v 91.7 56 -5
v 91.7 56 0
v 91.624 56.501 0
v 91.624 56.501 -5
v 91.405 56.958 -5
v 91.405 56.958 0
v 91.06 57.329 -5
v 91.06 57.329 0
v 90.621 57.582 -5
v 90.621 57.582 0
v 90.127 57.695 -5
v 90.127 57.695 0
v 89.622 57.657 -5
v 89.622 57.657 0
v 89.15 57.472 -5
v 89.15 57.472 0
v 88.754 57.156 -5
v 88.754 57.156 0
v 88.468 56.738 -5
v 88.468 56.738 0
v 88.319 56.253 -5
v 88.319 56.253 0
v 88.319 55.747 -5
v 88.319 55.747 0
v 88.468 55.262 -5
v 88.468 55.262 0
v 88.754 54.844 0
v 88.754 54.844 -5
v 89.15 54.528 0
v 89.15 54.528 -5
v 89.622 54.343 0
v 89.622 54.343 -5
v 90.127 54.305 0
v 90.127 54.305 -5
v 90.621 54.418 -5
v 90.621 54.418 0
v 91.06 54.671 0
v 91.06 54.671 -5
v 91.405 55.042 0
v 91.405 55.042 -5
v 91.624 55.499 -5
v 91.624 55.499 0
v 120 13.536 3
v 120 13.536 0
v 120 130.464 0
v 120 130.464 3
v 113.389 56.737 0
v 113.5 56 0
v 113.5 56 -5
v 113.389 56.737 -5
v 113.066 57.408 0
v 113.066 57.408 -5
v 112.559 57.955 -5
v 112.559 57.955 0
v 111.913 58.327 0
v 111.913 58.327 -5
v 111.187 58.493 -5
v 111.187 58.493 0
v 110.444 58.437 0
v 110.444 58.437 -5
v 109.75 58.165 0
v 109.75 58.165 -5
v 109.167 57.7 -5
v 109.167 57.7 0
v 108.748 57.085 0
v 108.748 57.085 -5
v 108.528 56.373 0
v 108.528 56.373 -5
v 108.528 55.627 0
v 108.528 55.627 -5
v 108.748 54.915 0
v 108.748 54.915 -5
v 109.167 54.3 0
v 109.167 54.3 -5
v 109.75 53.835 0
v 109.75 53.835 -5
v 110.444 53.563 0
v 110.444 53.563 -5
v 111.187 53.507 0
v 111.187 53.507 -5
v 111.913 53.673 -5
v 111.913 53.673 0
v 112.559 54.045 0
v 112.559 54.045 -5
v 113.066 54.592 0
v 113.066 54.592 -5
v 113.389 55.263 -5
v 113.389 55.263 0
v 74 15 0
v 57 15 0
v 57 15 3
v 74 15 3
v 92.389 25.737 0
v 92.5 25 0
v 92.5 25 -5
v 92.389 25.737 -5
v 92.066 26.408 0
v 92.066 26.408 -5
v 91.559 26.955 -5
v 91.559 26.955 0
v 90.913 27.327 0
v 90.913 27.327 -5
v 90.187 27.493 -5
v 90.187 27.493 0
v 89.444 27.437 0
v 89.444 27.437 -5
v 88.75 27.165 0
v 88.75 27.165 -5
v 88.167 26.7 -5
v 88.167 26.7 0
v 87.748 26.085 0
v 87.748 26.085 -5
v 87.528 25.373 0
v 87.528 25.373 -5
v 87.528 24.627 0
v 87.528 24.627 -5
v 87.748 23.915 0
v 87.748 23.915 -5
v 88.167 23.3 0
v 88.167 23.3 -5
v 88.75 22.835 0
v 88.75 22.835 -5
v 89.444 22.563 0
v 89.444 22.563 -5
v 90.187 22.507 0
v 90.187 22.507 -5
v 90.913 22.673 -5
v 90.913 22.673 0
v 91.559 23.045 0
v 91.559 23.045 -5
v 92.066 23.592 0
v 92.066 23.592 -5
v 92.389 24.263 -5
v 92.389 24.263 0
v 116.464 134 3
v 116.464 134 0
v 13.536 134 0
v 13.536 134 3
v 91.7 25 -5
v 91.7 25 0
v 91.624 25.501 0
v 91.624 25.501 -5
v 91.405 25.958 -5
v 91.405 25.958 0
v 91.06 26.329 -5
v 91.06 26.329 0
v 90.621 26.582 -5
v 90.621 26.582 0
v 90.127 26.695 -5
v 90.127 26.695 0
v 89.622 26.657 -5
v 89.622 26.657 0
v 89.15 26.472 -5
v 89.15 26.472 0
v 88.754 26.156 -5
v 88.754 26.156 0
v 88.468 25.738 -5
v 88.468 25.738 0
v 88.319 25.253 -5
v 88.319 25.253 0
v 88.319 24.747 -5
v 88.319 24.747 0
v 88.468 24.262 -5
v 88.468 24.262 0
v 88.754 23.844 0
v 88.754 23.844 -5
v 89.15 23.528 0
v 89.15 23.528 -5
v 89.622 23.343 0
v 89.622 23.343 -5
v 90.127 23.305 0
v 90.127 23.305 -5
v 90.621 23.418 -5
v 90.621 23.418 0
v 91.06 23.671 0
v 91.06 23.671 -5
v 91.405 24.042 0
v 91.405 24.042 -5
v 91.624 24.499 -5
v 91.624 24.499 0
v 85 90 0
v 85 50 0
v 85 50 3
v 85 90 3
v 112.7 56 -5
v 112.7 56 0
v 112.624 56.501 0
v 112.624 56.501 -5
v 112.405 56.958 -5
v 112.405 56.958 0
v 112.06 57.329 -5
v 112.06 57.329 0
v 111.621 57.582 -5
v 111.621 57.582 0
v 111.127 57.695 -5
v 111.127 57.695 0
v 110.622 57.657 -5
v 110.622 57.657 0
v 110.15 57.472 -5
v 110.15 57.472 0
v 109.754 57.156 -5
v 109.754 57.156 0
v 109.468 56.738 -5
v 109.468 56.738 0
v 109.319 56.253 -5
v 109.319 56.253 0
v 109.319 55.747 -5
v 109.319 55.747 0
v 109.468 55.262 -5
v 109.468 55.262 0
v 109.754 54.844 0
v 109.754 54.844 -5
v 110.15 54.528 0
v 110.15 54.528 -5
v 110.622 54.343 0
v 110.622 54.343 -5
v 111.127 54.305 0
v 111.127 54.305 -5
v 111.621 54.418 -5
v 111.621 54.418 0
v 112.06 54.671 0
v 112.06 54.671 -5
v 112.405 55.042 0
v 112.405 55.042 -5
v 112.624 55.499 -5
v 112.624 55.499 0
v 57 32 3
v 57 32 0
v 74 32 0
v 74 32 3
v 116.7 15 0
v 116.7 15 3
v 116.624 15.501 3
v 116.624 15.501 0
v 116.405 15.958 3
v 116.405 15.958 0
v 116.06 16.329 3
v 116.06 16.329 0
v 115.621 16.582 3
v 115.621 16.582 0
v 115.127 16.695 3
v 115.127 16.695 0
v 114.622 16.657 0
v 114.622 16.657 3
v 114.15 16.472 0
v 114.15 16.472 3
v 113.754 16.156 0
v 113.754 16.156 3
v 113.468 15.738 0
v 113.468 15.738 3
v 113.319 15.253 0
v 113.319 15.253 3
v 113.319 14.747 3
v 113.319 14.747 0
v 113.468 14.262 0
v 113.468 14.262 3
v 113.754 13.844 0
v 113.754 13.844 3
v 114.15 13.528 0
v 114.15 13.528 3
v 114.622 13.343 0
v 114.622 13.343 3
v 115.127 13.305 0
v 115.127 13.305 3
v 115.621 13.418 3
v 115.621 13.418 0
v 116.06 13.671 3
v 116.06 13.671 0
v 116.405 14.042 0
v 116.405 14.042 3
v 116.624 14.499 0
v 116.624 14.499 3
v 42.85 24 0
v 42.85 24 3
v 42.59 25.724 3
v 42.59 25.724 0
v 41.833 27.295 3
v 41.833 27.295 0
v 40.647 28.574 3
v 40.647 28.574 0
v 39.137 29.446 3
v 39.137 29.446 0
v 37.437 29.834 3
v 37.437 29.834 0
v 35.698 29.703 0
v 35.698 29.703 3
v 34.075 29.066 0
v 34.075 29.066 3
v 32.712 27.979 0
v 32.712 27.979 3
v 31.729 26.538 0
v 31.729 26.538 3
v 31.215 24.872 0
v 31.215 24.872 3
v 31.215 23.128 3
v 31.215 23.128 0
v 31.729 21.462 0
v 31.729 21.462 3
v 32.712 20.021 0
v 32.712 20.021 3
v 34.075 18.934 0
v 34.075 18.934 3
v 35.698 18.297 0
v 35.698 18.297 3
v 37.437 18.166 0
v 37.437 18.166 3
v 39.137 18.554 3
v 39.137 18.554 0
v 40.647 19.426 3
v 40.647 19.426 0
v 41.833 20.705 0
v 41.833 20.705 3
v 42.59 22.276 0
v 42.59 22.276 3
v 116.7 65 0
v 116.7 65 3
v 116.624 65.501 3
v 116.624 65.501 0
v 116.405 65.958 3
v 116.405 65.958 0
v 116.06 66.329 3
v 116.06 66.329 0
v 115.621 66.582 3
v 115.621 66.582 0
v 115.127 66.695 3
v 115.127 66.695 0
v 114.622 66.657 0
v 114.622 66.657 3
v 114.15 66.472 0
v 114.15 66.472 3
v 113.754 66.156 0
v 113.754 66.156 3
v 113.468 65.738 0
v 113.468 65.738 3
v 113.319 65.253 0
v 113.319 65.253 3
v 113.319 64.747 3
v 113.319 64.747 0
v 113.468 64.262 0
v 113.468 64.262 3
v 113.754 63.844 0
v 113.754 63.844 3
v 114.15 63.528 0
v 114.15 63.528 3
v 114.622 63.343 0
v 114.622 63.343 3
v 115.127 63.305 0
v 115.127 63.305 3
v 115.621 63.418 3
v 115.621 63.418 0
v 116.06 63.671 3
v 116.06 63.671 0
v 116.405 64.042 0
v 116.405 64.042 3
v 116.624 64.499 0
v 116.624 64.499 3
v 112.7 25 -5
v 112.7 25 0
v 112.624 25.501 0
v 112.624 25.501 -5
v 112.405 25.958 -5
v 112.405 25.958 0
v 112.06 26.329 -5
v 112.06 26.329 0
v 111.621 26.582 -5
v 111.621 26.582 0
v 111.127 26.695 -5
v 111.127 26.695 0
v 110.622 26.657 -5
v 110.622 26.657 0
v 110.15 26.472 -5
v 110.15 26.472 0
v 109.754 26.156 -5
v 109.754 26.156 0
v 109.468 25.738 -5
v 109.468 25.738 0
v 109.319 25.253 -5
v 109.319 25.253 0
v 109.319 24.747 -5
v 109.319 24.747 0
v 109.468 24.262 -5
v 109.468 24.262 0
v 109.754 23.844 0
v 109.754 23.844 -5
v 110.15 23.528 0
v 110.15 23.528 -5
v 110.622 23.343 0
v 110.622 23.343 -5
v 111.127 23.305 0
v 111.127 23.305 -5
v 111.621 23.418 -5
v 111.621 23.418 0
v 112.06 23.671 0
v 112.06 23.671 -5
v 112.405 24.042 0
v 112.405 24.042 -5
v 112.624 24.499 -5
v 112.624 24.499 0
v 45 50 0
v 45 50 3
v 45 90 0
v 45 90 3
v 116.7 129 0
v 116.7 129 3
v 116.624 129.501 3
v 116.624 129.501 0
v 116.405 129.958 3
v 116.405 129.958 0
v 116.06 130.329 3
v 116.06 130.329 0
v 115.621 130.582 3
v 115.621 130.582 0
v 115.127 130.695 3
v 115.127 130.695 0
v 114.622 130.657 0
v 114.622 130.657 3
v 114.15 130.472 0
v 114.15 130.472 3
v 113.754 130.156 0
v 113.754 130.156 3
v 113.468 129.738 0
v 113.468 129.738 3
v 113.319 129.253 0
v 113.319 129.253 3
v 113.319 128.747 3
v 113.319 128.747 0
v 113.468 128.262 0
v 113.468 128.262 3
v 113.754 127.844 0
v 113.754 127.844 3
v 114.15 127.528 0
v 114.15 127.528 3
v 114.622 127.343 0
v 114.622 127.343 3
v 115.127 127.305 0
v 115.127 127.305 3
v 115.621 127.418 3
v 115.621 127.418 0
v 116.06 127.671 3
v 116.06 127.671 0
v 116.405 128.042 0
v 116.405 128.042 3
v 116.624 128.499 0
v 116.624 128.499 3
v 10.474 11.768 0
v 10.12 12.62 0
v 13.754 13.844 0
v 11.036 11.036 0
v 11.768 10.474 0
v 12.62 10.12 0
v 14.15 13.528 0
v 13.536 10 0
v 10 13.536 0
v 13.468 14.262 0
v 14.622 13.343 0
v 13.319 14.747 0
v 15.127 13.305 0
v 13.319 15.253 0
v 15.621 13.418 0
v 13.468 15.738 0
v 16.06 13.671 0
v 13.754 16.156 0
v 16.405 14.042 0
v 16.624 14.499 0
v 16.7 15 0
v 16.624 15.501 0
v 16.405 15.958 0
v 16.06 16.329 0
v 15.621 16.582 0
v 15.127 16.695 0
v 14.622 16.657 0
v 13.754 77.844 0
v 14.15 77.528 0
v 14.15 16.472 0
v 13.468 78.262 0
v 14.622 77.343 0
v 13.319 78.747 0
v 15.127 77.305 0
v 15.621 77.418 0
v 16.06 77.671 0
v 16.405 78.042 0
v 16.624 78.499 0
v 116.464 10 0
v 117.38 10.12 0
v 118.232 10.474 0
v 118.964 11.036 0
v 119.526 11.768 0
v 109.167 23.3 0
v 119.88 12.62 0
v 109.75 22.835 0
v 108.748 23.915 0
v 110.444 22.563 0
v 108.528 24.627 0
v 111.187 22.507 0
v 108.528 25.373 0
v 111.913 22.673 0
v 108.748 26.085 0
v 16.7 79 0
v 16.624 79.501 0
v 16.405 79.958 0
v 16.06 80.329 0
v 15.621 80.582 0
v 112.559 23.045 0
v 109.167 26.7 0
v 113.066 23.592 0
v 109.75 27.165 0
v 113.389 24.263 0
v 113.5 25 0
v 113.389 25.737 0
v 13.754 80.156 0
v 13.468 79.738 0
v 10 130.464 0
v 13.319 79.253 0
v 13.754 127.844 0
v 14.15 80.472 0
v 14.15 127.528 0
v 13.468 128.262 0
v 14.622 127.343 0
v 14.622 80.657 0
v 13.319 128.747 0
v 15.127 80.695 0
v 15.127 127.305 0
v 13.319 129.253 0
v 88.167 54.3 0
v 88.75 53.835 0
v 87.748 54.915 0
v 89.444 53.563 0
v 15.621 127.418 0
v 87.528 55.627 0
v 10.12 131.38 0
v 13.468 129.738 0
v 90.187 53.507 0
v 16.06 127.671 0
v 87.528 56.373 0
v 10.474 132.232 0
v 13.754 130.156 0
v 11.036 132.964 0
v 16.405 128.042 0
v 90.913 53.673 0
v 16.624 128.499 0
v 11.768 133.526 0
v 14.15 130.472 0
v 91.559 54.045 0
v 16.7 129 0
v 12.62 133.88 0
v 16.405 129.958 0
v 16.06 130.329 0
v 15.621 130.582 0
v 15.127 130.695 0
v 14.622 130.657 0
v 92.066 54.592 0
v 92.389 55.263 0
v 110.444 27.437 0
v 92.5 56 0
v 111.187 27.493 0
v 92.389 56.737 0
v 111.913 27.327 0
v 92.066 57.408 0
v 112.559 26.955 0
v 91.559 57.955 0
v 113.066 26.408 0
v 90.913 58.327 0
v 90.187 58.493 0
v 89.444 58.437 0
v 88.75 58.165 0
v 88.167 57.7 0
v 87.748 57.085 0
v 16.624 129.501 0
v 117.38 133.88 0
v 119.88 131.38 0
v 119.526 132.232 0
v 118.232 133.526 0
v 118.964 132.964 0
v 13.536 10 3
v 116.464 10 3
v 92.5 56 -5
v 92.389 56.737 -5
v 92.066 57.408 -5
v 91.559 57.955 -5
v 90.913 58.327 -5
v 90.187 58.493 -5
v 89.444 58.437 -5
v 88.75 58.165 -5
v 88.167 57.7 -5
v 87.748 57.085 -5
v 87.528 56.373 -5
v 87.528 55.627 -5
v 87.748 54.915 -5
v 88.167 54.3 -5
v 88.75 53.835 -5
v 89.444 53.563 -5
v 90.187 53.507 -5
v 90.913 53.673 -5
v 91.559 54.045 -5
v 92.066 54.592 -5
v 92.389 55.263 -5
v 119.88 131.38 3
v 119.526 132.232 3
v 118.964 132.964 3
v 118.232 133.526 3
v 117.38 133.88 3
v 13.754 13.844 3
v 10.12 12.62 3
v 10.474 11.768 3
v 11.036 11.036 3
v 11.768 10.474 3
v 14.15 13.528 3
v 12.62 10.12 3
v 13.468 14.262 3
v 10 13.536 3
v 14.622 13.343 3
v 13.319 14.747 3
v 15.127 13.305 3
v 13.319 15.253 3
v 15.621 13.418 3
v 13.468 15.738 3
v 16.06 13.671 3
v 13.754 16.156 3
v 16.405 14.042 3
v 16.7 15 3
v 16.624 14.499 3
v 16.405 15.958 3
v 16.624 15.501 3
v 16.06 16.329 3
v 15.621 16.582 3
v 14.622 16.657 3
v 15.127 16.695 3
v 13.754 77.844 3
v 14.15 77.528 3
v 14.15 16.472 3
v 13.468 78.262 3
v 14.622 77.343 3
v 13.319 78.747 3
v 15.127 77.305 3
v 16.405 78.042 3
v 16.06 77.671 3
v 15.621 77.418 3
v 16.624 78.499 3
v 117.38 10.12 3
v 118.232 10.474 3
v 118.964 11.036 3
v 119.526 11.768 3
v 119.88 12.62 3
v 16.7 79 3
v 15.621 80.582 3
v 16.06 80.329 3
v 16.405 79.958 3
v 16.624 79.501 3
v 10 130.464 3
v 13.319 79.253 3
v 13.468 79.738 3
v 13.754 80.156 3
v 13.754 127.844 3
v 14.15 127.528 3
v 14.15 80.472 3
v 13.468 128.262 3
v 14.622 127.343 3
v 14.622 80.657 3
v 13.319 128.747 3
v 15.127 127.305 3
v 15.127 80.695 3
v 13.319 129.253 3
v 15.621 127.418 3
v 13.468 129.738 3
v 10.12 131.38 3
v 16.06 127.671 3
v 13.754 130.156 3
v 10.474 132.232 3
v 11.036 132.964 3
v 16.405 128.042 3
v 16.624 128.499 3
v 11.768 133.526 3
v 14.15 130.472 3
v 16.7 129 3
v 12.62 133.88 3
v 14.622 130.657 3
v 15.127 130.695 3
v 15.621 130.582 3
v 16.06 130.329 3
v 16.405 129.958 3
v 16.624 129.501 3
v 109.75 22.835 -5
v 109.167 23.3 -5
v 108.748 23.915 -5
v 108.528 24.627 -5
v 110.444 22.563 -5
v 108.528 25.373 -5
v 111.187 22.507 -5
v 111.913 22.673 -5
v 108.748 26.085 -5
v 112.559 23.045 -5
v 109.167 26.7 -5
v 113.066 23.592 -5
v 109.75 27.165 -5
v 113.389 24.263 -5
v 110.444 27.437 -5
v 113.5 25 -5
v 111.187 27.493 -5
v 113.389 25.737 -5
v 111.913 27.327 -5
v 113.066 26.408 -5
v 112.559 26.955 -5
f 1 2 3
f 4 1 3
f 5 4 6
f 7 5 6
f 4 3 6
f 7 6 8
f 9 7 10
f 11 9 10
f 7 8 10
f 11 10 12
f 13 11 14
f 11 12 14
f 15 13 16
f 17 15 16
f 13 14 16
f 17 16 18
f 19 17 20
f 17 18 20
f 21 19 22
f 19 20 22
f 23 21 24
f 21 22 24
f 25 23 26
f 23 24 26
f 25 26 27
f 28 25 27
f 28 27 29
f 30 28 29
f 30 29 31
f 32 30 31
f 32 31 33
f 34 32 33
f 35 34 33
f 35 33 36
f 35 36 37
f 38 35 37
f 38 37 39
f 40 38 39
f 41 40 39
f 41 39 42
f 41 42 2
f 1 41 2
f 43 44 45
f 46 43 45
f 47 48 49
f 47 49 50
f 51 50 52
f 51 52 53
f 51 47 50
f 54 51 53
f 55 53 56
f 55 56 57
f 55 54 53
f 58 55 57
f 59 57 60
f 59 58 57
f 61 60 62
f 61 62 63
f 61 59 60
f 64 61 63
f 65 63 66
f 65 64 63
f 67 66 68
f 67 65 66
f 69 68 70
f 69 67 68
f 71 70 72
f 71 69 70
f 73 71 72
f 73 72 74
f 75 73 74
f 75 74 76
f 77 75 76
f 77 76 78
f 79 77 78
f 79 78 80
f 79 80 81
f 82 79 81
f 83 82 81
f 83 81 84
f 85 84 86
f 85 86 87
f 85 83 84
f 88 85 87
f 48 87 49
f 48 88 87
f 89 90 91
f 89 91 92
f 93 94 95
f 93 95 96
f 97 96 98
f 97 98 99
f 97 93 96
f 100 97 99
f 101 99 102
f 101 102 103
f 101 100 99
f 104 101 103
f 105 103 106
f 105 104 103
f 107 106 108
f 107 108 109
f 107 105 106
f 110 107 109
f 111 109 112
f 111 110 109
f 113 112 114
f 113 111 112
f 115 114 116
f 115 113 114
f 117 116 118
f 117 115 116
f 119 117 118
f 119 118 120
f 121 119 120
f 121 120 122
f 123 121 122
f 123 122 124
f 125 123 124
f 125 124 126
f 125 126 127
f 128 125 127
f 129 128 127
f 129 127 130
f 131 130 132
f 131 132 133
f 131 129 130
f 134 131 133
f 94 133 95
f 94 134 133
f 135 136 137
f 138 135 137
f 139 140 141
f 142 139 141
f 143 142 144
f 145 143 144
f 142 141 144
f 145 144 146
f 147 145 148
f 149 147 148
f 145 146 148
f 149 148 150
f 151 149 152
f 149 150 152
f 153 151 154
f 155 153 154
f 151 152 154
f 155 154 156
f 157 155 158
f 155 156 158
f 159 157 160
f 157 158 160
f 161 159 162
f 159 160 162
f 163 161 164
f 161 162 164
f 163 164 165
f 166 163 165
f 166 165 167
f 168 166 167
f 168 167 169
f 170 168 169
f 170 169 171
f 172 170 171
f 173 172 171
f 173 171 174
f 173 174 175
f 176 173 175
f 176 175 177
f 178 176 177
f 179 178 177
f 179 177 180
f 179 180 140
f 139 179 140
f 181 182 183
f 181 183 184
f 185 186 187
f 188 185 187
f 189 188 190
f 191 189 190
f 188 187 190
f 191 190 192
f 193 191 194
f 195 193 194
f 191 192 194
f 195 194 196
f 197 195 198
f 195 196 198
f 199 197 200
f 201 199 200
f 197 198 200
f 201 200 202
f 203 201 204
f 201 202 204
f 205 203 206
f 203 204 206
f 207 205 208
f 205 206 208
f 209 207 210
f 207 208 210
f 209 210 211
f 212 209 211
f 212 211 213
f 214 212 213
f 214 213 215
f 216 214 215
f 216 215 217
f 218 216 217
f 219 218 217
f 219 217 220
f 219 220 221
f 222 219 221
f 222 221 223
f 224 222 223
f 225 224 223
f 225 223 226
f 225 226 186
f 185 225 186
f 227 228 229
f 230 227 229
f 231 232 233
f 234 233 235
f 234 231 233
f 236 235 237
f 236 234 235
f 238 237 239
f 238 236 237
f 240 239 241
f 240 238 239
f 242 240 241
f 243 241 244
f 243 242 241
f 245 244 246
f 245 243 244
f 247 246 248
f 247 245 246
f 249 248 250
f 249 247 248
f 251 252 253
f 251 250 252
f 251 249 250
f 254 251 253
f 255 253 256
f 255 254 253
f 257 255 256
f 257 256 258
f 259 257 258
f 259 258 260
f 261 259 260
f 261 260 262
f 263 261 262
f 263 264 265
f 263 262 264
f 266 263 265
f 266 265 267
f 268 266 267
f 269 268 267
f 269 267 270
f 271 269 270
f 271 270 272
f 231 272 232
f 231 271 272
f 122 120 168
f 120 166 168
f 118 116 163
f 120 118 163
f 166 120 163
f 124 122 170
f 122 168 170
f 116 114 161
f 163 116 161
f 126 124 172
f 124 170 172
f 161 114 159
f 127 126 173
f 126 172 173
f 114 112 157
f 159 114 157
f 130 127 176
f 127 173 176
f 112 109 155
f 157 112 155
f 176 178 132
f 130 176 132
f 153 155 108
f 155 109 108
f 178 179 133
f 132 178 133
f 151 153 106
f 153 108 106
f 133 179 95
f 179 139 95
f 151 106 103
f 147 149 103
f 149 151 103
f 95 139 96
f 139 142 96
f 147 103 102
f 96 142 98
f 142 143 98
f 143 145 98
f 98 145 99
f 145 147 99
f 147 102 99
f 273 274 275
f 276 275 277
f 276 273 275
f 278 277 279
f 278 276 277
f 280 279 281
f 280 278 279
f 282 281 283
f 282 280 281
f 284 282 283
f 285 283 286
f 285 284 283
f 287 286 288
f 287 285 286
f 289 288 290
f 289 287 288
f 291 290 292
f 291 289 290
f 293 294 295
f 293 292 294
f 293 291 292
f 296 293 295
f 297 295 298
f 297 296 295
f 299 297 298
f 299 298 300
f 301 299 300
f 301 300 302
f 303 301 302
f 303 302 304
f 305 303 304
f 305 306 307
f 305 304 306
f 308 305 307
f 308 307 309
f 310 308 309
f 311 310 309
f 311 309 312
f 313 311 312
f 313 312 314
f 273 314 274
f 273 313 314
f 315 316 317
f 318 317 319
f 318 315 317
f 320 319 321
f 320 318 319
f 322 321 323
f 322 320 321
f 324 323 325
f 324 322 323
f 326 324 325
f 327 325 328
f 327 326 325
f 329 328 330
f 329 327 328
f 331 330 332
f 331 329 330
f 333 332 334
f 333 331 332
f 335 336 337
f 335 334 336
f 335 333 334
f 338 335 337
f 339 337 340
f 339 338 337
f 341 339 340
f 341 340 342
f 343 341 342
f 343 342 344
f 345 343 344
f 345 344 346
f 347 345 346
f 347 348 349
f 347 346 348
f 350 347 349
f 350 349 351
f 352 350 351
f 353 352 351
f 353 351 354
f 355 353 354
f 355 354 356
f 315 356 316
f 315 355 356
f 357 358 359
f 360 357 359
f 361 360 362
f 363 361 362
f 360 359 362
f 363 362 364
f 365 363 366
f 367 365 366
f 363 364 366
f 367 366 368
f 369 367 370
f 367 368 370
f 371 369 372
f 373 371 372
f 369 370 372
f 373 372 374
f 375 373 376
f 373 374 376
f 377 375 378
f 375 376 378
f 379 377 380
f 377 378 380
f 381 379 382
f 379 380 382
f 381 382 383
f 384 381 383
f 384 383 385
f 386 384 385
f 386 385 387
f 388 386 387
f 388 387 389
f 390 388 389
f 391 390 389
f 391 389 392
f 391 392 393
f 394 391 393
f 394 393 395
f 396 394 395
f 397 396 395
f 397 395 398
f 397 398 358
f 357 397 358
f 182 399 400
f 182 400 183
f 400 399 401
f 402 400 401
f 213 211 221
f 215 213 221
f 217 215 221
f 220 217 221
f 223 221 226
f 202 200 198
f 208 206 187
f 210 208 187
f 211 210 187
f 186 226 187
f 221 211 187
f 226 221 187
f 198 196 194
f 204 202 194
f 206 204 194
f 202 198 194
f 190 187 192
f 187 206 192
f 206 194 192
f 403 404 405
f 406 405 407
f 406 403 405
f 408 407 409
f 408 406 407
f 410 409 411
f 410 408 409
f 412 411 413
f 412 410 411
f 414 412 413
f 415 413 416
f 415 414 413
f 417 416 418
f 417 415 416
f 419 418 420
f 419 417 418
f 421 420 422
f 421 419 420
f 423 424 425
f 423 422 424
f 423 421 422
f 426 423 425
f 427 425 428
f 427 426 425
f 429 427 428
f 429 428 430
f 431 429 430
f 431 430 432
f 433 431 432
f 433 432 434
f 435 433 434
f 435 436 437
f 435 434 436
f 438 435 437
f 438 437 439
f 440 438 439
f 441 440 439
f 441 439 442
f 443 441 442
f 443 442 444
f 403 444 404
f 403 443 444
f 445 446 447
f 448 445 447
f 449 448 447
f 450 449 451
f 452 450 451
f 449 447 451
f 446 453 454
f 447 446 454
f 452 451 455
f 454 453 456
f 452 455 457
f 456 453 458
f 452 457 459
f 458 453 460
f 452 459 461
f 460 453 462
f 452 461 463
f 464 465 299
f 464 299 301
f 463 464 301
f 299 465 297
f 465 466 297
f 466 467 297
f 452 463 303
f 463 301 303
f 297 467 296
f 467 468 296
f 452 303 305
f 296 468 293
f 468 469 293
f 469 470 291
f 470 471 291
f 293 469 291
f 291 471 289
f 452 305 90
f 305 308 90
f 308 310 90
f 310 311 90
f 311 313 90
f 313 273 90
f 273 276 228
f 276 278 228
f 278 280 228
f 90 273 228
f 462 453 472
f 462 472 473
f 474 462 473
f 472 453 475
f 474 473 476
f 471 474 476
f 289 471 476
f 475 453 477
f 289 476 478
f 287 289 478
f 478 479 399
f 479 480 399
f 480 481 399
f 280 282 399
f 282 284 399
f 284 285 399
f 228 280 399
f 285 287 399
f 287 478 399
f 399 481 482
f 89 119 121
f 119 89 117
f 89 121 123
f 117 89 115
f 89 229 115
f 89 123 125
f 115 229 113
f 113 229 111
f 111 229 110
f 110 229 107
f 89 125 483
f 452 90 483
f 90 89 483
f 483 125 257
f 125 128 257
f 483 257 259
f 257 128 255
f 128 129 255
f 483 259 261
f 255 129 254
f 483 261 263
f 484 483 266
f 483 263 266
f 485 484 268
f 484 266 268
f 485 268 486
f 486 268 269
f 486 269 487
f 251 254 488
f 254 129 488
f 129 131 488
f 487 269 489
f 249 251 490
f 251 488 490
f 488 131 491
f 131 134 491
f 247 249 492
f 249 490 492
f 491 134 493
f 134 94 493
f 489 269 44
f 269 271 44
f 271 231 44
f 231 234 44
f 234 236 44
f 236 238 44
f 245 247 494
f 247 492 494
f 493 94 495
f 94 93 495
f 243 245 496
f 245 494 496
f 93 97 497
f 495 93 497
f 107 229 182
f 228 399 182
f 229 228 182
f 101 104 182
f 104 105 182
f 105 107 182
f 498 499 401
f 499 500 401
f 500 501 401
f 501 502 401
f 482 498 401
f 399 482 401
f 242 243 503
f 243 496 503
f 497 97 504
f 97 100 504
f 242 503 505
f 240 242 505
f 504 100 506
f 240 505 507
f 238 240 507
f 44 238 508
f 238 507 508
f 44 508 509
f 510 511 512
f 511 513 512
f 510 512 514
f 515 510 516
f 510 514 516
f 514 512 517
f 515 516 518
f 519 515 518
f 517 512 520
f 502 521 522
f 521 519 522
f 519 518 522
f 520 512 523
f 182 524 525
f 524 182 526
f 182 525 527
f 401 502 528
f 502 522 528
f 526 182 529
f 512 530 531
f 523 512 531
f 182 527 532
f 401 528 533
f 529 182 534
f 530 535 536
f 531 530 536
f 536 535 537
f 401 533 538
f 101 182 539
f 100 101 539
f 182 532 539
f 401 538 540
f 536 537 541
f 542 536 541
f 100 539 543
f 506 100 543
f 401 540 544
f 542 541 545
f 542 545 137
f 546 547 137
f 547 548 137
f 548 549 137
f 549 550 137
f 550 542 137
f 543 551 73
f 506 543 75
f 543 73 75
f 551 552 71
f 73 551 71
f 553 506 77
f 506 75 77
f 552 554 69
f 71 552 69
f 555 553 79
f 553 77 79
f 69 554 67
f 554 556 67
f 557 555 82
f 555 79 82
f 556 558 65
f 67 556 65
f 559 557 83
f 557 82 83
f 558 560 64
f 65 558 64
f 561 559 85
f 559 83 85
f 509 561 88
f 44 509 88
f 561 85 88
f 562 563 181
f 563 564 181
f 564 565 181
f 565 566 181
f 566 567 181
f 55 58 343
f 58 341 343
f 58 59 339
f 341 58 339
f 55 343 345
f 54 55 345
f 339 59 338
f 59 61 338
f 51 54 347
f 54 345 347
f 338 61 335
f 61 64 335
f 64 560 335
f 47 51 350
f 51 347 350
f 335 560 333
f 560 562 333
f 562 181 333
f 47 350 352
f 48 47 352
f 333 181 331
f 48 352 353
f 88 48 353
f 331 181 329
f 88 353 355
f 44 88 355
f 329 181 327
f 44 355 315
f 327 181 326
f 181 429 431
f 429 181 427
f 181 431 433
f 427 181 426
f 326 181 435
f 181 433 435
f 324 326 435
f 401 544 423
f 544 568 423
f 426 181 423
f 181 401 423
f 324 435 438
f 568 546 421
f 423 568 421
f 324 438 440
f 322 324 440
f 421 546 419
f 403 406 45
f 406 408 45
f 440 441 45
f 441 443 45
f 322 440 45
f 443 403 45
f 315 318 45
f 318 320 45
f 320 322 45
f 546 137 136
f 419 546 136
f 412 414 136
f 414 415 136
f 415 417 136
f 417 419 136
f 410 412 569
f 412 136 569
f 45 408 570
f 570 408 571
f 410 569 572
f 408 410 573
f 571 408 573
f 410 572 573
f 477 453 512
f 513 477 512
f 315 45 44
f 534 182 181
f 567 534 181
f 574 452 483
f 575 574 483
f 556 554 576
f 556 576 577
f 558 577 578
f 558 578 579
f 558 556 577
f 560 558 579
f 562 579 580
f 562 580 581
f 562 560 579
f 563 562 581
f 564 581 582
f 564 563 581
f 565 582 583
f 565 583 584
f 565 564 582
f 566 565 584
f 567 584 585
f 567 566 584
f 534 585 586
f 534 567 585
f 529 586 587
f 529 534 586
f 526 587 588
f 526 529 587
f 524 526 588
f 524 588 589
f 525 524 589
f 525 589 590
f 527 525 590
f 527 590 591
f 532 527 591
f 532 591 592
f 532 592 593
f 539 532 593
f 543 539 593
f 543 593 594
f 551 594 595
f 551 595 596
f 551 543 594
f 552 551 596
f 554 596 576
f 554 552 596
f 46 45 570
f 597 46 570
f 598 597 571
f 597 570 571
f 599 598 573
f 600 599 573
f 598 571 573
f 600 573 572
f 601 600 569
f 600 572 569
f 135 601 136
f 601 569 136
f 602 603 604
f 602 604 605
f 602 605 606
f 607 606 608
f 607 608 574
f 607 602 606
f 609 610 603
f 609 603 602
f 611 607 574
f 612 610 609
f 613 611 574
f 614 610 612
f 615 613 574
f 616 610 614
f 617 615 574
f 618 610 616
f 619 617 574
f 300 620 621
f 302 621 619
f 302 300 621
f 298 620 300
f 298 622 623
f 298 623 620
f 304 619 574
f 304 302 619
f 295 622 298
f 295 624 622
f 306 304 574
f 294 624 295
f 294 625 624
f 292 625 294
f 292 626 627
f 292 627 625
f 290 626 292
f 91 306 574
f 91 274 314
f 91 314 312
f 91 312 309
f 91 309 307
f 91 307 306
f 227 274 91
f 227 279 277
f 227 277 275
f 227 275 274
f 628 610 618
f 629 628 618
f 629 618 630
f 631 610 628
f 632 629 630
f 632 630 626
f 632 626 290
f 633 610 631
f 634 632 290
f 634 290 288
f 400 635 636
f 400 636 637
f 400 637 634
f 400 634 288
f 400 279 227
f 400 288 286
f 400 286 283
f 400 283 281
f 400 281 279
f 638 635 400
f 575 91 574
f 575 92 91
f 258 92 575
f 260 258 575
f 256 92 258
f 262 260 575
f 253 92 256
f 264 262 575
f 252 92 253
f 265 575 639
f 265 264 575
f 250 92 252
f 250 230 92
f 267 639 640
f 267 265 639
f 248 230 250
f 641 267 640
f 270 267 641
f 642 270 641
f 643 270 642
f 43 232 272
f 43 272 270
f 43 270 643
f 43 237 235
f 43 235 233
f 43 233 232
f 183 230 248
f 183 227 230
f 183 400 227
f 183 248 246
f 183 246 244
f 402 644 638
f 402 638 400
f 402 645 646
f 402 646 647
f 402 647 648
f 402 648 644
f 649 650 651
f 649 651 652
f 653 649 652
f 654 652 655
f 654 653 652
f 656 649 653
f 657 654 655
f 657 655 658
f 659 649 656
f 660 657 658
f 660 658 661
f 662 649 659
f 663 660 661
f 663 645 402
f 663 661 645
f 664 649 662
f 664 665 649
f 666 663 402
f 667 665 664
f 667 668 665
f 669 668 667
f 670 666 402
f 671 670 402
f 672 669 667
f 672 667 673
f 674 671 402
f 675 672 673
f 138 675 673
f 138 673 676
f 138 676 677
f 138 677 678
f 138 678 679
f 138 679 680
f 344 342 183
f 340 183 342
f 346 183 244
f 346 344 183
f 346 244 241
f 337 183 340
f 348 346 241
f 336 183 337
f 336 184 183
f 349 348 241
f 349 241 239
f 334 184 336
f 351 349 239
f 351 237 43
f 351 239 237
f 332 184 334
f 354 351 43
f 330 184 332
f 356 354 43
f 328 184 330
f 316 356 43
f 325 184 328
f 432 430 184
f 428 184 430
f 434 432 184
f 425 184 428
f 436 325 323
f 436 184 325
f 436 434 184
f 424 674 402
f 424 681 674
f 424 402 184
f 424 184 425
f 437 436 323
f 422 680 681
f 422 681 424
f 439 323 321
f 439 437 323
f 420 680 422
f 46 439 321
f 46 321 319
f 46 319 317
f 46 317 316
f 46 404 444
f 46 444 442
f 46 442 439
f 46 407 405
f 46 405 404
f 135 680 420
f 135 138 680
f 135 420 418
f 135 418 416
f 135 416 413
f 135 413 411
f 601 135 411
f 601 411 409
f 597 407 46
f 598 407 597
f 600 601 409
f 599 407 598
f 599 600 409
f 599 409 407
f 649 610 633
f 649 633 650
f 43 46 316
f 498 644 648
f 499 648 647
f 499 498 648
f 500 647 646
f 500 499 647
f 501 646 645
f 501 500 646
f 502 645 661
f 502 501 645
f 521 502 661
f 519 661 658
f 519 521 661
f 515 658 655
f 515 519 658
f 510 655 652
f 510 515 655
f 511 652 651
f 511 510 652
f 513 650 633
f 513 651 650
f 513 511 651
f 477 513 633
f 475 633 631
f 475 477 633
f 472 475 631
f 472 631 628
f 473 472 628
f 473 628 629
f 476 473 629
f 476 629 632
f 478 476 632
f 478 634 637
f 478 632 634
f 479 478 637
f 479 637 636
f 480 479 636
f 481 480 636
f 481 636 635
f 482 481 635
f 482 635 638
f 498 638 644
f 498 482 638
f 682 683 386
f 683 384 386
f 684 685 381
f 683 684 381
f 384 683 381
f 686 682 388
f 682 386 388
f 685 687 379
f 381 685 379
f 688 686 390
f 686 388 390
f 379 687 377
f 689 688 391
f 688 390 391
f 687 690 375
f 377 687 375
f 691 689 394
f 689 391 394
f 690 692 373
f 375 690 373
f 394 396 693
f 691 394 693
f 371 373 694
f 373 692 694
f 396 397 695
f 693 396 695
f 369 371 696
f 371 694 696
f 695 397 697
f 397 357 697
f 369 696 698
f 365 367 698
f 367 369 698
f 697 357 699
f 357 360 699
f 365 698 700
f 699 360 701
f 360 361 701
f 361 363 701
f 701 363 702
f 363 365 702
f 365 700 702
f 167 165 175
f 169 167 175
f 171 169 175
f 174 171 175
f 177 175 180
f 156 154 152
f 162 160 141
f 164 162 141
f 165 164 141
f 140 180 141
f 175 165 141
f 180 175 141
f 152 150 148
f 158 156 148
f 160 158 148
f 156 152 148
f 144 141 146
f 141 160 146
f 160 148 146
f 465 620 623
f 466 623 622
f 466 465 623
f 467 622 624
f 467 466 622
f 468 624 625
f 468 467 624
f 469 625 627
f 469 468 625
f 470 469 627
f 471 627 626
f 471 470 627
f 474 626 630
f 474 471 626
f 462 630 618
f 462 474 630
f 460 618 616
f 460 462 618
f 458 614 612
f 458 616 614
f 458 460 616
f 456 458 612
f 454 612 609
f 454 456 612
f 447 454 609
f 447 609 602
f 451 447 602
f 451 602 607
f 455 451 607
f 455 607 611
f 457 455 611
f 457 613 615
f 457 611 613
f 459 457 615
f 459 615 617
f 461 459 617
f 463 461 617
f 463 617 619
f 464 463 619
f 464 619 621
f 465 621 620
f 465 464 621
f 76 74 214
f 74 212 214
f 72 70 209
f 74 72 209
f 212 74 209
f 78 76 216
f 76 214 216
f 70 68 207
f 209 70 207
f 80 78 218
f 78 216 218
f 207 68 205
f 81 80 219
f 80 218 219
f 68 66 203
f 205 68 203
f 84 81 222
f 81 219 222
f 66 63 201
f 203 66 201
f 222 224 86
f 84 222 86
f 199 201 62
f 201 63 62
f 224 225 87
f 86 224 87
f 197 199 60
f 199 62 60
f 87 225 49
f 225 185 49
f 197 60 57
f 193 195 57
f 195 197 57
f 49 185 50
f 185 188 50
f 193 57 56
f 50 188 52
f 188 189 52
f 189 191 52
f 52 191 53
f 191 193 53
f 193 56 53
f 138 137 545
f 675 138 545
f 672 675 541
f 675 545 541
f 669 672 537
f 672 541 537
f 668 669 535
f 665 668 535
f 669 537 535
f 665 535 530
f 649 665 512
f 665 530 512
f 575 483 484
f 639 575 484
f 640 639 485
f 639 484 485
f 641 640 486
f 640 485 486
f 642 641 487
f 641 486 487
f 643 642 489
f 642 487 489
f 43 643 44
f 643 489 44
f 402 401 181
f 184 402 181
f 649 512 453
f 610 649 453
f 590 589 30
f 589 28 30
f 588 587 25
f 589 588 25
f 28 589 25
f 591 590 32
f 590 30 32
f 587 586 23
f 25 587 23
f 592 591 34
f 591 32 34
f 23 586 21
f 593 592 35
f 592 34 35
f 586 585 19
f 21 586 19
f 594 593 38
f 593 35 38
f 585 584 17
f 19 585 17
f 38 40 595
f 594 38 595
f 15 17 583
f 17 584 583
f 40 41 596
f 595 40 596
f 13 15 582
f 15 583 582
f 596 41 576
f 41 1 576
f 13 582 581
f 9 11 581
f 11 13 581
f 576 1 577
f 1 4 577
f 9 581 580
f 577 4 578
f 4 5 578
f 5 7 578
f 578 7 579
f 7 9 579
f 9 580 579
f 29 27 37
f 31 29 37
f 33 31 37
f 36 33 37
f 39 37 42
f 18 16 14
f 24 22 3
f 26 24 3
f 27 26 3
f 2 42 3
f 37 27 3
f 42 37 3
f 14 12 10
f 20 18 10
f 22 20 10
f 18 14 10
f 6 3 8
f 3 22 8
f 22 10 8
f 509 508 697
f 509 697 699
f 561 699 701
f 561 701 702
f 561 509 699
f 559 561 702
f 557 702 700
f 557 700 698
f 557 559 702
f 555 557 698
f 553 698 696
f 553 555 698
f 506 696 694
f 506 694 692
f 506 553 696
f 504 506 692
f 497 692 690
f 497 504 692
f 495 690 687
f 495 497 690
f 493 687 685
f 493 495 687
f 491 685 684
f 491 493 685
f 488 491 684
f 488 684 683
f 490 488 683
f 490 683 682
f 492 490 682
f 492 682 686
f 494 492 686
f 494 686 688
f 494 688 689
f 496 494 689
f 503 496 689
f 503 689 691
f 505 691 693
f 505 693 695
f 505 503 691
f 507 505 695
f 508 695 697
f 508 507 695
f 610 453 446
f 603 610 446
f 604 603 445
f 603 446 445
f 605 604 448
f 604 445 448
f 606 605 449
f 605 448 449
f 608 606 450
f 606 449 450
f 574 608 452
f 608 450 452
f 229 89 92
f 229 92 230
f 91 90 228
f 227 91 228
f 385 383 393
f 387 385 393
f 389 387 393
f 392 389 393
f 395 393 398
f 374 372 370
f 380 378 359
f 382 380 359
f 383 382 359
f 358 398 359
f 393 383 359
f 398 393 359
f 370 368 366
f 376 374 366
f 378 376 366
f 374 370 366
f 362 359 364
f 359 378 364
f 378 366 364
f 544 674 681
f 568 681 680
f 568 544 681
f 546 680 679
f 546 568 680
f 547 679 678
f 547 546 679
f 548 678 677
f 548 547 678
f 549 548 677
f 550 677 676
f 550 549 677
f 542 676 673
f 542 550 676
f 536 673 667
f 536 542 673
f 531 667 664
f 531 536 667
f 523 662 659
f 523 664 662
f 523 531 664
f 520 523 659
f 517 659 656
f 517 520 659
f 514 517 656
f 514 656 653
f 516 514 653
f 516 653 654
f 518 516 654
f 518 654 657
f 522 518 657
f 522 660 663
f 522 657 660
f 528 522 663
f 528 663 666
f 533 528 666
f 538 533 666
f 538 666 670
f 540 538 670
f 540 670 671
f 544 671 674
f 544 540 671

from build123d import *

# Parameters (mm, degrees)
PAD_DEPTH       = 3
SKETCH001_R     = 1.7
HOLE_DEPTH      = 3.001
SKETCH002_W     = 40
SKETCH002_H     = 40
SKETCH002_W_2   = 17
SKETCH002_H_2   = 17
POCKET_DEPTH    = 3.001
SKETCH005_R     = 2.5
PAD001_DEPTH    = 5
SKETCH004_R     = 1.7
HOLE001_DEPTH   = 25
SKETCH003_R     = 5.85
POCKET001_DEPTH = 5


with BuildPart() as part:
    # Sketch → Pad (new body)
    with BuildSketch(Plane.XY):
        with BuildLine():
            Line((10, 130.464466), (10, 13.535534))
            ThreePointArc((10, 13.535534), (11.035534, 11.035534), (13.535534, 10))
            Line((13.535534, 10), (116.464466, 10))
            ThreePointArc((116.464466, 10), (118.964466, 11.035534), (120, 13.535534))
            Line((120, 13.535534), (120, 130.464466))
            ThreePointArc((120, 130.464466), (118.964466, 132.964466), (116.464466, 134))
            Line((116.464466, 134), (13.535534, 134))
            ThreePointArc((13.535534, 134), (11.035534, 132.964466), (10, 130.464466))
        make_face()
    extrude(amount=PAD_DEPTH)

    # Sketch001 → Hole (cut, through all)
    with BuildSketch(Plane.XY):
        with Locations((15, 129)):
            Circle(SKETCH001_R)
        with Locations((15, 79)):
            Circle(SKETCH001_R)
        with Locations((15, 15)):
            Circle(SKETCH001_R)
        with Locations((115, 15)):
            Circle(SKETCH001_R)
        with Locations((115, 65)):
            Circle(SKETCH001_R)
        with Locations((115, 129)):
            Circle(SKETCH001_R)
    extrude(amount=HOLE_DEPTH, mode=Mode.SUBTRACT)

    # Sketch002 → Pocket (cut, through all)
    with BuildSketch(Plane.XY):
        with Locations((65, 70)):
            Rectangle(SKETCH002_W, SKETCH002_H)
        with Locations((65.5, 23.5)):
            Rectangle(SKETCH002_W_2, SKETCH002_H_2)
    extrude(amount=POCKET_DEPTH, mode=Mode.SUBTRACT)

    # Sketch005 → Pad001 (join)
    with BuildSketch(Plane.XY):
        with Locations((90, 56)):
            Circle(SKETCH005_R)
        with Locations((111, 56)):
            Circle(SKETCH005_R)
        with Locations((90, 25)):
            Circle(SKETCH005_R)
        with Locations((111, 25)):
            Circle(SKETCH005_R)
    extrude(amount=-PAD001_DEPTH)

    # Sketch004 → Hole001 (cut)
    with BuildSketch(Plane.XY):
        with Locations((90, 56)):
            Circle(SKETCH004_R)
        with Locations((111, 56)):
            Circle(SKETCH004_R)
        with Locations((90, 25)):
            Circle(SKETCH004_R)
        with Locations((111, 25)):
            Circle(SKETCH004_R)
    extrude(amount=-HOLE001_DEPTH, mode=Mode.SUBTRACT)

    # Sketch003 → Pocket001 (cut)
    with BuildSketch(Plane.XY):
        with Locations((37, 24)):
            Circle(SKETCH003_R)
    extrude(amount=POCKET001_DEPTH, mode=Mode.SUBTRACT)


solid = part.part
